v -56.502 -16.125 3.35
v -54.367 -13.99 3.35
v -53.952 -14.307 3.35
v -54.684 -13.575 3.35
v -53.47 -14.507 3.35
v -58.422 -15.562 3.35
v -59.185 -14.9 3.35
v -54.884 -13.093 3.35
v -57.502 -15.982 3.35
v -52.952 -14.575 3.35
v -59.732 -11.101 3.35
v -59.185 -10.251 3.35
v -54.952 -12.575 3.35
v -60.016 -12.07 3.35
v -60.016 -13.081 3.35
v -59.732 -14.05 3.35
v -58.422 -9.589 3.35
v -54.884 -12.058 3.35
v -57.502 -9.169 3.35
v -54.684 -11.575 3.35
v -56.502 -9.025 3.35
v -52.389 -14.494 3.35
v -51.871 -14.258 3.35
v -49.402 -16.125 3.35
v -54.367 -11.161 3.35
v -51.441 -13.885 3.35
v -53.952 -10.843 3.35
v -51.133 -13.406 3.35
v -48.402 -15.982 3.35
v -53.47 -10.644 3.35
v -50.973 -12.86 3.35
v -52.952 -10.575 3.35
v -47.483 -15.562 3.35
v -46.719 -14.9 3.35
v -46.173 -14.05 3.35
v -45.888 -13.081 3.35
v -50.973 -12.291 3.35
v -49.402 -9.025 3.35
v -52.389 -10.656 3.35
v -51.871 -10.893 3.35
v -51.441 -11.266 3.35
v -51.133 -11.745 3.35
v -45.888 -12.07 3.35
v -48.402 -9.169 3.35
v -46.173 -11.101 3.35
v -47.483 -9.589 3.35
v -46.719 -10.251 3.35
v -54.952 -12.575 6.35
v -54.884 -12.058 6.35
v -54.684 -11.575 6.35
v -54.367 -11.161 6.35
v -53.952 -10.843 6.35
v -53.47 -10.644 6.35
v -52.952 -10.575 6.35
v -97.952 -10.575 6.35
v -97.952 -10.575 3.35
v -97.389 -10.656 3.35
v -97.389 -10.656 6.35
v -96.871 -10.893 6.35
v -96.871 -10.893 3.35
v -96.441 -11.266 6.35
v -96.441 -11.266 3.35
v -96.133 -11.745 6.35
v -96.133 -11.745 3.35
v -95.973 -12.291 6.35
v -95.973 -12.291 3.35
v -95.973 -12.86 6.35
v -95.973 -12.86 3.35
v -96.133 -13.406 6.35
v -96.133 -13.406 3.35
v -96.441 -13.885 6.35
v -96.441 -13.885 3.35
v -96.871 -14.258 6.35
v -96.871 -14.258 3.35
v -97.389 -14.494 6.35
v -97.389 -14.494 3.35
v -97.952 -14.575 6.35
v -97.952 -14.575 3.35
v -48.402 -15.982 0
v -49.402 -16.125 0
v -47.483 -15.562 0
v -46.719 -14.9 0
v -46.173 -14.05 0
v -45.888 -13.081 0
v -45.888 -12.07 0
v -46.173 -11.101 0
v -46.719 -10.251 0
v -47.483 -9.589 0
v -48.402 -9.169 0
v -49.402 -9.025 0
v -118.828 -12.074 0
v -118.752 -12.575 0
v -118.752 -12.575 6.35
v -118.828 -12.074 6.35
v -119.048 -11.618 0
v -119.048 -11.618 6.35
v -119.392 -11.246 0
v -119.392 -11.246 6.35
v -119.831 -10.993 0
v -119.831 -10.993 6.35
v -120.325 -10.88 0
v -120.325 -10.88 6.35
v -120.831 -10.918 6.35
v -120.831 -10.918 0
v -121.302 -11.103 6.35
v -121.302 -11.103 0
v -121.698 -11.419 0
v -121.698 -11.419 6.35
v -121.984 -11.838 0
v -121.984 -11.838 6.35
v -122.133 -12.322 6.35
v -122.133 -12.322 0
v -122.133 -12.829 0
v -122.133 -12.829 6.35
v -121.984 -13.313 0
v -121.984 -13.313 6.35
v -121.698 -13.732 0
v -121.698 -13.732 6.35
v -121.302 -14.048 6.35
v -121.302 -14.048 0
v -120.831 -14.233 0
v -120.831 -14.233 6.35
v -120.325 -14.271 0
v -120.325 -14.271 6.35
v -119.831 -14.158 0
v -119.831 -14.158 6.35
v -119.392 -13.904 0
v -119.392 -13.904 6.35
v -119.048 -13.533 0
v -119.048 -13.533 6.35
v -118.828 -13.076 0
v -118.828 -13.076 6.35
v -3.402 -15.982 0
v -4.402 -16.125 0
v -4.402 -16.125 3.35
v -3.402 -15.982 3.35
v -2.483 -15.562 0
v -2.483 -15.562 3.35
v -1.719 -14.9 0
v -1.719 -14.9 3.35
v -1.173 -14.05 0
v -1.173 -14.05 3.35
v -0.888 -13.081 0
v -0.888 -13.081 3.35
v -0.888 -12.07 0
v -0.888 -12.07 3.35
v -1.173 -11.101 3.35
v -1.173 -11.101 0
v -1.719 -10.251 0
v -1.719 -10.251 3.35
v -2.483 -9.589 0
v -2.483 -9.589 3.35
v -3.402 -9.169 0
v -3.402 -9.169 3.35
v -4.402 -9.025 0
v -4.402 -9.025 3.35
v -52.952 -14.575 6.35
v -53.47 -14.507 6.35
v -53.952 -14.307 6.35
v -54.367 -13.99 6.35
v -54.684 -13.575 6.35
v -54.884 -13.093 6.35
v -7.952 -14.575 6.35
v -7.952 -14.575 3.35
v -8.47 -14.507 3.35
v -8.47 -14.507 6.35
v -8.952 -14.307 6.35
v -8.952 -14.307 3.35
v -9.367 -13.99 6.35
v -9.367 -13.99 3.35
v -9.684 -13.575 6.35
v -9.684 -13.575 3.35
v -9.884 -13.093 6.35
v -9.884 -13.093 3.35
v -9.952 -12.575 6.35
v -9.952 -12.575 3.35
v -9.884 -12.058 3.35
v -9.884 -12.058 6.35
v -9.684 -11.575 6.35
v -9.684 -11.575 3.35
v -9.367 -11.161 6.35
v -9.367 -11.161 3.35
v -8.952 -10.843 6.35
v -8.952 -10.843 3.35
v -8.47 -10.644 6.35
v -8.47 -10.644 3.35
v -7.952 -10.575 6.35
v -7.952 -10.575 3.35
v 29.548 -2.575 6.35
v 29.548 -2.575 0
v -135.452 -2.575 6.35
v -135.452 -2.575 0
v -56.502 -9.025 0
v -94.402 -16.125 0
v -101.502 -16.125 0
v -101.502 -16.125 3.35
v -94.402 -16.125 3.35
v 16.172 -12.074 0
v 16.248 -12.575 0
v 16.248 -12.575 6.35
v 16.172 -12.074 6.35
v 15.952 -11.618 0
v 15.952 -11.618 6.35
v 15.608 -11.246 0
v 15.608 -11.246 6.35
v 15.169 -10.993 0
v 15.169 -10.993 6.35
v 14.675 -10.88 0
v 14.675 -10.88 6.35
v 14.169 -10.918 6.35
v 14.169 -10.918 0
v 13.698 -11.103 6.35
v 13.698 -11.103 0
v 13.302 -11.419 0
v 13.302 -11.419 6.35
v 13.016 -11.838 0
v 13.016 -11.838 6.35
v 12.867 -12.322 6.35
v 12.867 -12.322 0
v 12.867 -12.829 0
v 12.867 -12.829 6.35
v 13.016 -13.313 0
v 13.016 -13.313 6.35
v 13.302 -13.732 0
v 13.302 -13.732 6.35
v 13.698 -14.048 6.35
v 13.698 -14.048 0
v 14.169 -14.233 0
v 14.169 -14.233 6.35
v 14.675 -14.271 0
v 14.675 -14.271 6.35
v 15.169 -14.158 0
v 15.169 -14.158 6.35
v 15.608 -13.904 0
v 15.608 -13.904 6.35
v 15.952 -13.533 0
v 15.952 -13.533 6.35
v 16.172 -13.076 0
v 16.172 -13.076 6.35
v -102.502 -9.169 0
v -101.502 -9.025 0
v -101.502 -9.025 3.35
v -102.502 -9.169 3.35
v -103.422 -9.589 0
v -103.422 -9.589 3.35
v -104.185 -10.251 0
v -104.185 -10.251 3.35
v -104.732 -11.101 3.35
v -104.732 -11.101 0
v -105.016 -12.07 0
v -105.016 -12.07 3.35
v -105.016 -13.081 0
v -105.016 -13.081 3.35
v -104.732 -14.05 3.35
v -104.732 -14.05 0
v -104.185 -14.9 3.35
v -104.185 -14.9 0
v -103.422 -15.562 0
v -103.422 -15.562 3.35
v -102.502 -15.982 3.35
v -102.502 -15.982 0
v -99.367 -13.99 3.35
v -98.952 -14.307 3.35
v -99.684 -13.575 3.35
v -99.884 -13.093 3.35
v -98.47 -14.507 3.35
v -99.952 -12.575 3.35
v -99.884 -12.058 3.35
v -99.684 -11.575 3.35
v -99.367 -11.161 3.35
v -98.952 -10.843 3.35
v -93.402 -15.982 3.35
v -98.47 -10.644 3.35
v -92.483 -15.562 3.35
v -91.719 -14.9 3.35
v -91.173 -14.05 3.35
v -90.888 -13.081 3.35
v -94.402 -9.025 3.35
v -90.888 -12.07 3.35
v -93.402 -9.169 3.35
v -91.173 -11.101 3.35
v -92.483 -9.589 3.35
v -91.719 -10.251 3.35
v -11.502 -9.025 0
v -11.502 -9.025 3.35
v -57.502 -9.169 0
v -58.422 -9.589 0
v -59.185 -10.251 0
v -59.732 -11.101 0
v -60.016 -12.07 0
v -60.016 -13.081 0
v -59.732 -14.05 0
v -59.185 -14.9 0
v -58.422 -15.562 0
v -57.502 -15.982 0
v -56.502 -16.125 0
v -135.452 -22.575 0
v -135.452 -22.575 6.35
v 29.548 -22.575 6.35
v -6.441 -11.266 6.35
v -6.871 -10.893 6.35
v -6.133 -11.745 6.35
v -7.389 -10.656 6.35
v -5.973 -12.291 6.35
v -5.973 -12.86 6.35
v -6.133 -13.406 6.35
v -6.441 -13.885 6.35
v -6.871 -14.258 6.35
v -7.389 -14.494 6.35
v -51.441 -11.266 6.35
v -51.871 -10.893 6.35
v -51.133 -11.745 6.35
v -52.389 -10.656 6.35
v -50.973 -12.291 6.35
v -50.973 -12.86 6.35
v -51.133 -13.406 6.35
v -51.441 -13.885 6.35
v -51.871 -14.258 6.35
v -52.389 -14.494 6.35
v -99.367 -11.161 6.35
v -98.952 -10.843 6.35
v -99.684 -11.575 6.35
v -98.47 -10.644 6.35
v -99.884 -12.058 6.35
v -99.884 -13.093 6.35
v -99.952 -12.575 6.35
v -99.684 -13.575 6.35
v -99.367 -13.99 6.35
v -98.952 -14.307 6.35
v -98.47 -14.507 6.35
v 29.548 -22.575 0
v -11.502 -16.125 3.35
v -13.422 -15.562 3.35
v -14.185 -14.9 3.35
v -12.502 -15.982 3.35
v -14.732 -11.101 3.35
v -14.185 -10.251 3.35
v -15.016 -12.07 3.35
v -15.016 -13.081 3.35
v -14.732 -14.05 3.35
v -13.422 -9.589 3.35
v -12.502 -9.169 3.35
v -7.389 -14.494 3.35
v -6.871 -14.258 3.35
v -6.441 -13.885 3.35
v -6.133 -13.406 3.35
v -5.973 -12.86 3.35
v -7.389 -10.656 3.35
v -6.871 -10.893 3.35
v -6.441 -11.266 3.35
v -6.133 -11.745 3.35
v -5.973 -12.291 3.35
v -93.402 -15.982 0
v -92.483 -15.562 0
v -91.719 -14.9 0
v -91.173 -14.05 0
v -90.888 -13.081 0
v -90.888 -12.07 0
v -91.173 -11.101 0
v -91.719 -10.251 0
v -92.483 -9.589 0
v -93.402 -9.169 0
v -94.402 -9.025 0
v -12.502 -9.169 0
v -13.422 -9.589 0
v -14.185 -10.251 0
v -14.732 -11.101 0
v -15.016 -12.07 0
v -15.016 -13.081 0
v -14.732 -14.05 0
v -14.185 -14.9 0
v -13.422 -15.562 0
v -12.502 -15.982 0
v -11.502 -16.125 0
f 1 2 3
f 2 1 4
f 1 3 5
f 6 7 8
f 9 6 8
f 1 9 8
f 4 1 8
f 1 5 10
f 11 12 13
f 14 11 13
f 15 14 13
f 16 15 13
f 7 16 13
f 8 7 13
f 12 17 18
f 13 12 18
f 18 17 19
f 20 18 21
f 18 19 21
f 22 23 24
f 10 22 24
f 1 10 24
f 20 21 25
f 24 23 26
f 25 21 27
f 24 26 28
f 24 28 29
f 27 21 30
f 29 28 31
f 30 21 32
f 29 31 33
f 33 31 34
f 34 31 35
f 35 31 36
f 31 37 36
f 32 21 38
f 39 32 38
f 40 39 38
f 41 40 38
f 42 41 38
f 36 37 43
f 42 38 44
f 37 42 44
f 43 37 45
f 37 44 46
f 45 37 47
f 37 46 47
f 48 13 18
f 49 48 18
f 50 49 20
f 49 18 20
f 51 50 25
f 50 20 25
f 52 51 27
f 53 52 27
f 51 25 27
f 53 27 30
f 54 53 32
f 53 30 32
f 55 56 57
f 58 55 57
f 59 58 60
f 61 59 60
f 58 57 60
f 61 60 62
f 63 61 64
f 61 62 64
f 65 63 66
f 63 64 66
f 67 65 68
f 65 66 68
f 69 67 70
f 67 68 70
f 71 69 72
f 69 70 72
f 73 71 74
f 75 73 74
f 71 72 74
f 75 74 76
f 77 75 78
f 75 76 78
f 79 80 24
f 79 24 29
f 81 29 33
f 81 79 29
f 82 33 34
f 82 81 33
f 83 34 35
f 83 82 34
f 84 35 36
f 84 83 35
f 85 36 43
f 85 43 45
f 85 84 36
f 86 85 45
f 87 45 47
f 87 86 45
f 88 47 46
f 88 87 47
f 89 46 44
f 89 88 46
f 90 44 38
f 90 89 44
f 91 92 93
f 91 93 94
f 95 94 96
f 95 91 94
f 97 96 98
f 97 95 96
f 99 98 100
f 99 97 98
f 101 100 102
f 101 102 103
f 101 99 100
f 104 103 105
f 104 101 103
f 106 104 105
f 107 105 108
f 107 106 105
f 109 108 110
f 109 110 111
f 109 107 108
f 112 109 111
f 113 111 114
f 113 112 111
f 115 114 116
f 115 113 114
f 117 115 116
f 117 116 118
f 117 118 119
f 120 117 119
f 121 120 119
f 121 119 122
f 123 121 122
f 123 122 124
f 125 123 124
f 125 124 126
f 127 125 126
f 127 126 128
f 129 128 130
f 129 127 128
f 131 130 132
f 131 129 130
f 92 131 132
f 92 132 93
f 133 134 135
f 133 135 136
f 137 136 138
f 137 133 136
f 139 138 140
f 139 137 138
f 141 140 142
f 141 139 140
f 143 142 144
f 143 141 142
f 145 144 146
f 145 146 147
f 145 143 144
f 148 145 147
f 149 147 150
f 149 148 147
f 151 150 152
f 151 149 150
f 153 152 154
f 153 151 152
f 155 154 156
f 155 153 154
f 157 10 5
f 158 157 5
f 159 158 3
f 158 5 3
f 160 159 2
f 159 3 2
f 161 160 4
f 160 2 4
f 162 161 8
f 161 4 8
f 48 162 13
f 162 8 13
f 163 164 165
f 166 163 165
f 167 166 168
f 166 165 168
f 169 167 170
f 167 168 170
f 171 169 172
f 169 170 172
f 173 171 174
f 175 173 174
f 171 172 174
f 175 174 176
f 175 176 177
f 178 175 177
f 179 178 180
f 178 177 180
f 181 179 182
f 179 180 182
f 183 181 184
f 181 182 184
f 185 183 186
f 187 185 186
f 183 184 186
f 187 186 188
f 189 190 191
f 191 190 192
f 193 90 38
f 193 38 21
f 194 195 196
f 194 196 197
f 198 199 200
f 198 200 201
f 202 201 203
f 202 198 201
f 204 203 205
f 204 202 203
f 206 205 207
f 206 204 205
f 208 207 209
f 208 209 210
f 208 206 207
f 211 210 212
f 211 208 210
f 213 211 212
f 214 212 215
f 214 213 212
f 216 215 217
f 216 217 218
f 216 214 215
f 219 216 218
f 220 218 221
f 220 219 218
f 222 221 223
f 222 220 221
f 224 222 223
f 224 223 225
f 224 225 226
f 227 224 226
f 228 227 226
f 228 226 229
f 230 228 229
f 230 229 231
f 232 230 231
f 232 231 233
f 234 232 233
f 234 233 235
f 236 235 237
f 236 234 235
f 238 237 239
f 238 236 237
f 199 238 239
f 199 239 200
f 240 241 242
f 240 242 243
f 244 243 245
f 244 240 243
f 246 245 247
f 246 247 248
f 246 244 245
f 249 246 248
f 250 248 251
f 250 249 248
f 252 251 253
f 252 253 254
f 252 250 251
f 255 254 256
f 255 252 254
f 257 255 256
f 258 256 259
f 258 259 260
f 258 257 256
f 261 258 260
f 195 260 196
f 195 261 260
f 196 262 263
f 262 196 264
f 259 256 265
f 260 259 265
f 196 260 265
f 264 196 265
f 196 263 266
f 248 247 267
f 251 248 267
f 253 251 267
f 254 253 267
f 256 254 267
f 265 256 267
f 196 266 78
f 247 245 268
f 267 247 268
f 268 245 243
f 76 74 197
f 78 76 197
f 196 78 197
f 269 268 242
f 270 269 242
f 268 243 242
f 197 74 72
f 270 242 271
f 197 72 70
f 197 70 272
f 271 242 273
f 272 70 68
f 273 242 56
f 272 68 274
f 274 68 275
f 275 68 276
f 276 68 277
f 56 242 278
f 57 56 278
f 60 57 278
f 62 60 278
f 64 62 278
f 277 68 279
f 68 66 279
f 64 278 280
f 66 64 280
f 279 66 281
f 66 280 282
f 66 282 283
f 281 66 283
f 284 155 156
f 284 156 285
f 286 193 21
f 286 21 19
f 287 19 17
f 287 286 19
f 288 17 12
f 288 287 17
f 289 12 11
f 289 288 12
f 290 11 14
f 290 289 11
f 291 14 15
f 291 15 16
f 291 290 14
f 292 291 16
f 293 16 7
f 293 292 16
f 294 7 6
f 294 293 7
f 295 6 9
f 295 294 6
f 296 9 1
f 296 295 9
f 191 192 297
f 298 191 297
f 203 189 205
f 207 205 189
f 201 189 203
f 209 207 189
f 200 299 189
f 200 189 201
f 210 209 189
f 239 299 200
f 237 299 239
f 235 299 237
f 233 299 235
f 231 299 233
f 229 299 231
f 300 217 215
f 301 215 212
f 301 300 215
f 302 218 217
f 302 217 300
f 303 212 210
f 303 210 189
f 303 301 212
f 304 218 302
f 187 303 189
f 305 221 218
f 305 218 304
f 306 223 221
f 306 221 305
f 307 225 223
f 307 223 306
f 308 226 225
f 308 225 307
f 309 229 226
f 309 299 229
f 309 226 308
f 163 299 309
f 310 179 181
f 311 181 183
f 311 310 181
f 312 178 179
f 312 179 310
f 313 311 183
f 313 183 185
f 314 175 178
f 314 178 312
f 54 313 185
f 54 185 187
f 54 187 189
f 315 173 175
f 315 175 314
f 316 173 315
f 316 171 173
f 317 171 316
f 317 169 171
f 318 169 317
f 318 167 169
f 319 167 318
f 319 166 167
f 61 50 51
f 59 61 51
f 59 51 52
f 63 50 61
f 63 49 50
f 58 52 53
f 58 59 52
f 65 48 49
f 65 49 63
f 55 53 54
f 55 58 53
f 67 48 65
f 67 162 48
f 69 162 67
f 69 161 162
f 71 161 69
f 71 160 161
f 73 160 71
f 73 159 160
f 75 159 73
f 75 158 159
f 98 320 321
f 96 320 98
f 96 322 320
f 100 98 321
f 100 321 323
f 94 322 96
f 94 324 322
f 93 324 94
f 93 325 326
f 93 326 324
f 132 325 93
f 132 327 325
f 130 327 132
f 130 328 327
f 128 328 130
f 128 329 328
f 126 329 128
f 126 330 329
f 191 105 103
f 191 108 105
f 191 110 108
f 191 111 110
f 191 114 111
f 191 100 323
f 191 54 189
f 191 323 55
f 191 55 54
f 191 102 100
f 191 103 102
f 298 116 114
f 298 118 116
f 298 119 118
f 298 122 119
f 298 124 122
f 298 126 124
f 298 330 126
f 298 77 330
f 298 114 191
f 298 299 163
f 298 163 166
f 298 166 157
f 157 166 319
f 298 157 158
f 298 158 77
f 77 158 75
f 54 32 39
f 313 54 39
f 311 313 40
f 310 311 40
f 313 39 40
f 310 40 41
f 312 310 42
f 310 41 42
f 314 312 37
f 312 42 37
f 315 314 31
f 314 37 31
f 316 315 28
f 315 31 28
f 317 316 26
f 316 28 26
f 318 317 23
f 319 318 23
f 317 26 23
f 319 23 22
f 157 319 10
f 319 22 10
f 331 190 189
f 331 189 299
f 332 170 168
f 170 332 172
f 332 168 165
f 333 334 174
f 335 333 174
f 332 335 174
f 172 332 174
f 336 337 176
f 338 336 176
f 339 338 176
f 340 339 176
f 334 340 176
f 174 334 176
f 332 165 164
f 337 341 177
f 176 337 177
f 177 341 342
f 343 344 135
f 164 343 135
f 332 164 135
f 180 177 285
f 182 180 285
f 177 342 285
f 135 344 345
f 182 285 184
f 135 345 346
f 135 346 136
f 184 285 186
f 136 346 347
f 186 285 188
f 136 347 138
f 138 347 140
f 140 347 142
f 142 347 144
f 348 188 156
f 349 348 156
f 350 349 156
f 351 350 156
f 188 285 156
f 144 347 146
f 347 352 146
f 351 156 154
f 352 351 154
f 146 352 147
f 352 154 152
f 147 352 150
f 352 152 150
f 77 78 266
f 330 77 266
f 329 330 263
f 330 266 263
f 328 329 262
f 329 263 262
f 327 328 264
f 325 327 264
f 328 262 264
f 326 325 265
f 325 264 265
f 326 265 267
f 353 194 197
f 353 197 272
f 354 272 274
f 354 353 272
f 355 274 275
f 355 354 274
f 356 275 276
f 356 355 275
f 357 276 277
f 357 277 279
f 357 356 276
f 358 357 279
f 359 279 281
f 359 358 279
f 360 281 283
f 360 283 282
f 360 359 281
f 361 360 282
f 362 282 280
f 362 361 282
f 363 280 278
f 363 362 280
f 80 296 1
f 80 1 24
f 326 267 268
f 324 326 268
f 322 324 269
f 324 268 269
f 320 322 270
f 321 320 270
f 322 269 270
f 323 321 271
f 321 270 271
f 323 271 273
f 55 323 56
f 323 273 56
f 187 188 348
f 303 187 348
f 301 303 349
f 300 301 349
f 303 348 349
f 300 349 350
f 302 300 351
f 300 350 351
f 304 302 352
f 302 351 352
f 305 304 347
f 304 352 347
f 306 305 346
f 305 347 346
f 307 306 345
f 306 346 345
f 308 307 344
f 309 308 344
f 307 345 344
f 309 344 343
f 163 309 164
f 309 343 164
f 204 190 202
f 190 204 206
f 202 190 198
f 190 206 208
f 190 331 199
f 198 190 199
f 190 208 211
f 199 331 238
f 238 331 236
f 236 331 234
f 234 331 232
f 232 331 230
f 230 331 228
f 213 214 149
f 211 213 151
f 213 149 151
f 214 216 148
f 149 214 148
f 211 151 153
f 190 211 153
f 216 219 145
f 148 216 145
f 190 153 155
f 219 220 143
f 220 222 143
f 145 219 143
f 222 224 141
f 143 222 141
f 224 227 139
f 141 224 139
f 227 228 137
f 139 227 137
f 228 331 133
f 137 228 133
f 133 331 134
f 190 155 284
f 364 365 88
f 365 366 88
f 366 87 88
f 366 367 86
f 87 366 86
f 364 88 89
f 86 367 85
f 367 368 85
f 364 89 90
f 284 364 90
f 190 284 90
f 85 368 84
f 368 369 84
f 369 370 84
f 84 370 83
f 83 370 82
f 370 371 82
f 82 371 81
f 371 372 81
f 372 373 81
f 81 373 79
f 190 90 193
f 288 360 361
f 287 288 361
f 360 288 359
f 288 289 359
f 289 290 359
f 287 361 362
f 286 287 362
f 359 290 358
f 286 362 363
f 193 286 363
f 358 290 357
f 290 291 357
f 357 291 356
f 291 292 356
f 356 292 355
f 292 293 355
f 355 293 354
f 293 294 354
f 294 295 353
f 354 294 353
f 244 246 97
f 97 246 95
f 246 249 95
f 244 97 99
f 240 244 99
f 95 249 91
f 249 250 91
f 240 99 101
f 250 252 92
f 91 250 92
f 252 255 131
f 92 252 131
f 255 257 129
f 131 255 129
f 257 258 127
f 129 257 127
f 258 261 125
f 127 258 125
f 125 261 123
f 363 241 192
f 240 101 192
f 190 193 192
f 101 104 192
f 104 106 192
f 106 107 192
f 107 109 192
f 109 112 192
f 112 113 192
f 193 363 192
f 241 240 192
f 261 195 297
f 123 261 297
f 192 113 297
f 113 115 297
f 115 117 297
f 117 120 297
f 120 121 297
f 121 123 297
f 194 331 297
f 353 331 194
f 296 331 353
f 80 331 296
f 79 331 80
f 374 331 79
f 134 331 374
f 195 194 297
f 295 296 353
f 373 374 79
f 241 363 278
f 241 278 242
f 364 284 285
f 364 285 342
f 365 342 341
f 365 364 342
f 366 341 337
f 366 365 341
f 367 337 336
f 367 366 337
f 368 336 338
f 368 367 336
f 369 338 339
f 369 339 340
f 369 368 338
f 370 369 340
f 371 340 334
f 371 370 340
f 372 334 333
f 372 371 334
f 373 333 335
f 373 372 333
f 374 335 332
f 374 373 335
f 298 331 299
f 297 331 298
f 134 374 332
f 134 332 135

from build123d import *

# Parameters (mm, degrees)
SKETCH1_W           = 165
SKETCH1_H           = 20
SKETCH1_R           = 1.7
BOSS_EXTRUDE1_DEPTH = 6.35
CUT_EXTRUDE2_DEPTH  = 3.35
CUT_EXTRUDE3_DEPTH  = 3


with BuildPart() as part:
    # Sketch1 → Boss-Extrude1 (new body)
    with BuildSketch(Plane(origin=(0, 0, 0), x_dir=(-1, 0, 0), z_dir=(0, 0, 1))):
        with Locations((52.952306935, 12.575384489)):
            Rectangle(SKETCH1_W, SKETCH1_H)
        with Locations(Location((120.452306935, 12.575384489, 0), (0, 0, 180))):
            Circle(SKETCH1_R, mode=Mode.SUBTRACT)
        with Locations(Location((-14.547693065, 12.575384489, 0), (0, 0, 180))):
            Circle(SKETCH1_R, mode=Mode.SUBTRACT)
    extrude(amount=BOSS_EXTRUDE1_DEPTH)

    # Sketch3 → Cut-Extrude2 (cut)
    with BuildSketch(Plane(origin=(0, 0, 0), x_dir=(-1, 0, 0), z_dir=(0, 0, -1))):
        with BuildLine():
            Line((56.502306935, -16.125384489), (49.402306935, -16.125384489))
            ThreePointArc((49.402306935, -16.125384489), (45.852306935, -12.575384489), (49.402306935, -9.025384489))
            Line((49.402306935, -9.025384489), (56.502306935, -9.025384489))
            ThreePointArc((56.502306935, -9.025384489), (60.052306935, -12.575384489), (56.502306935, -16.125384489))
        make_face()
        with BuildLine():
            Line((101.502306935, -16.125384489), (94.402306935, -16.125384489))
            ThreePointArc((94.402306935, -16.125384489), (90.852306935, -12.575384489), (94.402306935, -9.025384489))
            Line((94.402306935, -9.025384489), (101.502306935, -9.025384489))
            ThreePointArc((101.502306935, -9.025384489), (105.052306935, -12.575384489), (101.502306935, -16.125384489))
        make_face()
        with BuildLine():
            Line((11.502306935, -16.125384489), (4.402306935, -16.125384489))
            ThreePointArc((4.402306935, -16.125384489), (0.852306935, -12.575384489), (4.402306935, -9.025384489))
            Line((4.402306935, -9.025384489), (11.502306935, -9.025384489))
            ThreePointArc((11.502306935, -9.025384489), (15.052306935, -12.575384489), (11.502306935, -16.125384489))
        make_face()
    extrude(amount=-CUT_EXTRUDE2_DEPTH, mode=Mode.SUBTRACT)

    # Sketch4 → Cut-Extrude3 (cut)
    with BuildSketch(Plane(origin=(0, 0, 3.35), x_dir=(-1, 0, 0), z_dir=(0, 0, -1))):
        with BuildLine():
            ThreePointArc((9.952306935, -12.575384489), (9.366520498, -11.161170927), (7.952306935, -10.575384489))
            Line((7.952306935, -10.575384489), (7.952306935, -14.575384489))
            ThreePointArc((7.952306935, -14.575384489), (9.366520498, -13.989598052), (9.952306935, -12.575384489))
        make_face()
        with BuildLine():
            Line((7.952306935, -14.575384489), (7.952306935, -10.575384489))
            ThreePointArc((7.952306935, -10.575384489), (5.952306935, -12.575384489), (7.952306935, -14.575384489))
        make_face()
        with BuildLine():
            ThreePointArc((52.952306935, -10.575384489), (50.952306935, -12.575384489), (52.952306935, -14.575384489))
            Line((52.952306935, -14.575384489), (52.952306935, -10.575384489))
        make_face()
        with BuildLine():
            Line((52.952306935, -10.575384489), (52.952306935, -14.575384489))
            ThreePointArc((52.952306935, -14.575384489), (54.366520498, -13.989598052), (54.952306935, -12.575384489))
            ThreePointArc((54.952306935, -12.575384489), (54.366520498, -11.161170927), (52.952306935, -10.575384489))
        make_face()
        with BuildLine():
            ThreePointArc((99.952306935, -12.575384489), (99.366520498, -11.161170927), (97.952306935, -10.575384489))
            Line((97.952306935, -10.575384489), (97.952306935, -14.575384489))
            ThreePointArc((97.952306935, -14.575384489), (99.366520498, -13.989598052), (99.952306935, -12.575384489))
        make_face()
        with BuildLine():
            Line((97.952306935, -14.575384489), (97.952306935, -10.575384489))
            ThreePointArc((97.952306935, -10.575384489), (95.952306935, -12.575384489), (97.952306935, -14.575384489))
        make_face()
    extrude(amount=-CUT_EXTRUDE3_DEPTH, mode=Mode.SUBTRACT)


solid = part.part
